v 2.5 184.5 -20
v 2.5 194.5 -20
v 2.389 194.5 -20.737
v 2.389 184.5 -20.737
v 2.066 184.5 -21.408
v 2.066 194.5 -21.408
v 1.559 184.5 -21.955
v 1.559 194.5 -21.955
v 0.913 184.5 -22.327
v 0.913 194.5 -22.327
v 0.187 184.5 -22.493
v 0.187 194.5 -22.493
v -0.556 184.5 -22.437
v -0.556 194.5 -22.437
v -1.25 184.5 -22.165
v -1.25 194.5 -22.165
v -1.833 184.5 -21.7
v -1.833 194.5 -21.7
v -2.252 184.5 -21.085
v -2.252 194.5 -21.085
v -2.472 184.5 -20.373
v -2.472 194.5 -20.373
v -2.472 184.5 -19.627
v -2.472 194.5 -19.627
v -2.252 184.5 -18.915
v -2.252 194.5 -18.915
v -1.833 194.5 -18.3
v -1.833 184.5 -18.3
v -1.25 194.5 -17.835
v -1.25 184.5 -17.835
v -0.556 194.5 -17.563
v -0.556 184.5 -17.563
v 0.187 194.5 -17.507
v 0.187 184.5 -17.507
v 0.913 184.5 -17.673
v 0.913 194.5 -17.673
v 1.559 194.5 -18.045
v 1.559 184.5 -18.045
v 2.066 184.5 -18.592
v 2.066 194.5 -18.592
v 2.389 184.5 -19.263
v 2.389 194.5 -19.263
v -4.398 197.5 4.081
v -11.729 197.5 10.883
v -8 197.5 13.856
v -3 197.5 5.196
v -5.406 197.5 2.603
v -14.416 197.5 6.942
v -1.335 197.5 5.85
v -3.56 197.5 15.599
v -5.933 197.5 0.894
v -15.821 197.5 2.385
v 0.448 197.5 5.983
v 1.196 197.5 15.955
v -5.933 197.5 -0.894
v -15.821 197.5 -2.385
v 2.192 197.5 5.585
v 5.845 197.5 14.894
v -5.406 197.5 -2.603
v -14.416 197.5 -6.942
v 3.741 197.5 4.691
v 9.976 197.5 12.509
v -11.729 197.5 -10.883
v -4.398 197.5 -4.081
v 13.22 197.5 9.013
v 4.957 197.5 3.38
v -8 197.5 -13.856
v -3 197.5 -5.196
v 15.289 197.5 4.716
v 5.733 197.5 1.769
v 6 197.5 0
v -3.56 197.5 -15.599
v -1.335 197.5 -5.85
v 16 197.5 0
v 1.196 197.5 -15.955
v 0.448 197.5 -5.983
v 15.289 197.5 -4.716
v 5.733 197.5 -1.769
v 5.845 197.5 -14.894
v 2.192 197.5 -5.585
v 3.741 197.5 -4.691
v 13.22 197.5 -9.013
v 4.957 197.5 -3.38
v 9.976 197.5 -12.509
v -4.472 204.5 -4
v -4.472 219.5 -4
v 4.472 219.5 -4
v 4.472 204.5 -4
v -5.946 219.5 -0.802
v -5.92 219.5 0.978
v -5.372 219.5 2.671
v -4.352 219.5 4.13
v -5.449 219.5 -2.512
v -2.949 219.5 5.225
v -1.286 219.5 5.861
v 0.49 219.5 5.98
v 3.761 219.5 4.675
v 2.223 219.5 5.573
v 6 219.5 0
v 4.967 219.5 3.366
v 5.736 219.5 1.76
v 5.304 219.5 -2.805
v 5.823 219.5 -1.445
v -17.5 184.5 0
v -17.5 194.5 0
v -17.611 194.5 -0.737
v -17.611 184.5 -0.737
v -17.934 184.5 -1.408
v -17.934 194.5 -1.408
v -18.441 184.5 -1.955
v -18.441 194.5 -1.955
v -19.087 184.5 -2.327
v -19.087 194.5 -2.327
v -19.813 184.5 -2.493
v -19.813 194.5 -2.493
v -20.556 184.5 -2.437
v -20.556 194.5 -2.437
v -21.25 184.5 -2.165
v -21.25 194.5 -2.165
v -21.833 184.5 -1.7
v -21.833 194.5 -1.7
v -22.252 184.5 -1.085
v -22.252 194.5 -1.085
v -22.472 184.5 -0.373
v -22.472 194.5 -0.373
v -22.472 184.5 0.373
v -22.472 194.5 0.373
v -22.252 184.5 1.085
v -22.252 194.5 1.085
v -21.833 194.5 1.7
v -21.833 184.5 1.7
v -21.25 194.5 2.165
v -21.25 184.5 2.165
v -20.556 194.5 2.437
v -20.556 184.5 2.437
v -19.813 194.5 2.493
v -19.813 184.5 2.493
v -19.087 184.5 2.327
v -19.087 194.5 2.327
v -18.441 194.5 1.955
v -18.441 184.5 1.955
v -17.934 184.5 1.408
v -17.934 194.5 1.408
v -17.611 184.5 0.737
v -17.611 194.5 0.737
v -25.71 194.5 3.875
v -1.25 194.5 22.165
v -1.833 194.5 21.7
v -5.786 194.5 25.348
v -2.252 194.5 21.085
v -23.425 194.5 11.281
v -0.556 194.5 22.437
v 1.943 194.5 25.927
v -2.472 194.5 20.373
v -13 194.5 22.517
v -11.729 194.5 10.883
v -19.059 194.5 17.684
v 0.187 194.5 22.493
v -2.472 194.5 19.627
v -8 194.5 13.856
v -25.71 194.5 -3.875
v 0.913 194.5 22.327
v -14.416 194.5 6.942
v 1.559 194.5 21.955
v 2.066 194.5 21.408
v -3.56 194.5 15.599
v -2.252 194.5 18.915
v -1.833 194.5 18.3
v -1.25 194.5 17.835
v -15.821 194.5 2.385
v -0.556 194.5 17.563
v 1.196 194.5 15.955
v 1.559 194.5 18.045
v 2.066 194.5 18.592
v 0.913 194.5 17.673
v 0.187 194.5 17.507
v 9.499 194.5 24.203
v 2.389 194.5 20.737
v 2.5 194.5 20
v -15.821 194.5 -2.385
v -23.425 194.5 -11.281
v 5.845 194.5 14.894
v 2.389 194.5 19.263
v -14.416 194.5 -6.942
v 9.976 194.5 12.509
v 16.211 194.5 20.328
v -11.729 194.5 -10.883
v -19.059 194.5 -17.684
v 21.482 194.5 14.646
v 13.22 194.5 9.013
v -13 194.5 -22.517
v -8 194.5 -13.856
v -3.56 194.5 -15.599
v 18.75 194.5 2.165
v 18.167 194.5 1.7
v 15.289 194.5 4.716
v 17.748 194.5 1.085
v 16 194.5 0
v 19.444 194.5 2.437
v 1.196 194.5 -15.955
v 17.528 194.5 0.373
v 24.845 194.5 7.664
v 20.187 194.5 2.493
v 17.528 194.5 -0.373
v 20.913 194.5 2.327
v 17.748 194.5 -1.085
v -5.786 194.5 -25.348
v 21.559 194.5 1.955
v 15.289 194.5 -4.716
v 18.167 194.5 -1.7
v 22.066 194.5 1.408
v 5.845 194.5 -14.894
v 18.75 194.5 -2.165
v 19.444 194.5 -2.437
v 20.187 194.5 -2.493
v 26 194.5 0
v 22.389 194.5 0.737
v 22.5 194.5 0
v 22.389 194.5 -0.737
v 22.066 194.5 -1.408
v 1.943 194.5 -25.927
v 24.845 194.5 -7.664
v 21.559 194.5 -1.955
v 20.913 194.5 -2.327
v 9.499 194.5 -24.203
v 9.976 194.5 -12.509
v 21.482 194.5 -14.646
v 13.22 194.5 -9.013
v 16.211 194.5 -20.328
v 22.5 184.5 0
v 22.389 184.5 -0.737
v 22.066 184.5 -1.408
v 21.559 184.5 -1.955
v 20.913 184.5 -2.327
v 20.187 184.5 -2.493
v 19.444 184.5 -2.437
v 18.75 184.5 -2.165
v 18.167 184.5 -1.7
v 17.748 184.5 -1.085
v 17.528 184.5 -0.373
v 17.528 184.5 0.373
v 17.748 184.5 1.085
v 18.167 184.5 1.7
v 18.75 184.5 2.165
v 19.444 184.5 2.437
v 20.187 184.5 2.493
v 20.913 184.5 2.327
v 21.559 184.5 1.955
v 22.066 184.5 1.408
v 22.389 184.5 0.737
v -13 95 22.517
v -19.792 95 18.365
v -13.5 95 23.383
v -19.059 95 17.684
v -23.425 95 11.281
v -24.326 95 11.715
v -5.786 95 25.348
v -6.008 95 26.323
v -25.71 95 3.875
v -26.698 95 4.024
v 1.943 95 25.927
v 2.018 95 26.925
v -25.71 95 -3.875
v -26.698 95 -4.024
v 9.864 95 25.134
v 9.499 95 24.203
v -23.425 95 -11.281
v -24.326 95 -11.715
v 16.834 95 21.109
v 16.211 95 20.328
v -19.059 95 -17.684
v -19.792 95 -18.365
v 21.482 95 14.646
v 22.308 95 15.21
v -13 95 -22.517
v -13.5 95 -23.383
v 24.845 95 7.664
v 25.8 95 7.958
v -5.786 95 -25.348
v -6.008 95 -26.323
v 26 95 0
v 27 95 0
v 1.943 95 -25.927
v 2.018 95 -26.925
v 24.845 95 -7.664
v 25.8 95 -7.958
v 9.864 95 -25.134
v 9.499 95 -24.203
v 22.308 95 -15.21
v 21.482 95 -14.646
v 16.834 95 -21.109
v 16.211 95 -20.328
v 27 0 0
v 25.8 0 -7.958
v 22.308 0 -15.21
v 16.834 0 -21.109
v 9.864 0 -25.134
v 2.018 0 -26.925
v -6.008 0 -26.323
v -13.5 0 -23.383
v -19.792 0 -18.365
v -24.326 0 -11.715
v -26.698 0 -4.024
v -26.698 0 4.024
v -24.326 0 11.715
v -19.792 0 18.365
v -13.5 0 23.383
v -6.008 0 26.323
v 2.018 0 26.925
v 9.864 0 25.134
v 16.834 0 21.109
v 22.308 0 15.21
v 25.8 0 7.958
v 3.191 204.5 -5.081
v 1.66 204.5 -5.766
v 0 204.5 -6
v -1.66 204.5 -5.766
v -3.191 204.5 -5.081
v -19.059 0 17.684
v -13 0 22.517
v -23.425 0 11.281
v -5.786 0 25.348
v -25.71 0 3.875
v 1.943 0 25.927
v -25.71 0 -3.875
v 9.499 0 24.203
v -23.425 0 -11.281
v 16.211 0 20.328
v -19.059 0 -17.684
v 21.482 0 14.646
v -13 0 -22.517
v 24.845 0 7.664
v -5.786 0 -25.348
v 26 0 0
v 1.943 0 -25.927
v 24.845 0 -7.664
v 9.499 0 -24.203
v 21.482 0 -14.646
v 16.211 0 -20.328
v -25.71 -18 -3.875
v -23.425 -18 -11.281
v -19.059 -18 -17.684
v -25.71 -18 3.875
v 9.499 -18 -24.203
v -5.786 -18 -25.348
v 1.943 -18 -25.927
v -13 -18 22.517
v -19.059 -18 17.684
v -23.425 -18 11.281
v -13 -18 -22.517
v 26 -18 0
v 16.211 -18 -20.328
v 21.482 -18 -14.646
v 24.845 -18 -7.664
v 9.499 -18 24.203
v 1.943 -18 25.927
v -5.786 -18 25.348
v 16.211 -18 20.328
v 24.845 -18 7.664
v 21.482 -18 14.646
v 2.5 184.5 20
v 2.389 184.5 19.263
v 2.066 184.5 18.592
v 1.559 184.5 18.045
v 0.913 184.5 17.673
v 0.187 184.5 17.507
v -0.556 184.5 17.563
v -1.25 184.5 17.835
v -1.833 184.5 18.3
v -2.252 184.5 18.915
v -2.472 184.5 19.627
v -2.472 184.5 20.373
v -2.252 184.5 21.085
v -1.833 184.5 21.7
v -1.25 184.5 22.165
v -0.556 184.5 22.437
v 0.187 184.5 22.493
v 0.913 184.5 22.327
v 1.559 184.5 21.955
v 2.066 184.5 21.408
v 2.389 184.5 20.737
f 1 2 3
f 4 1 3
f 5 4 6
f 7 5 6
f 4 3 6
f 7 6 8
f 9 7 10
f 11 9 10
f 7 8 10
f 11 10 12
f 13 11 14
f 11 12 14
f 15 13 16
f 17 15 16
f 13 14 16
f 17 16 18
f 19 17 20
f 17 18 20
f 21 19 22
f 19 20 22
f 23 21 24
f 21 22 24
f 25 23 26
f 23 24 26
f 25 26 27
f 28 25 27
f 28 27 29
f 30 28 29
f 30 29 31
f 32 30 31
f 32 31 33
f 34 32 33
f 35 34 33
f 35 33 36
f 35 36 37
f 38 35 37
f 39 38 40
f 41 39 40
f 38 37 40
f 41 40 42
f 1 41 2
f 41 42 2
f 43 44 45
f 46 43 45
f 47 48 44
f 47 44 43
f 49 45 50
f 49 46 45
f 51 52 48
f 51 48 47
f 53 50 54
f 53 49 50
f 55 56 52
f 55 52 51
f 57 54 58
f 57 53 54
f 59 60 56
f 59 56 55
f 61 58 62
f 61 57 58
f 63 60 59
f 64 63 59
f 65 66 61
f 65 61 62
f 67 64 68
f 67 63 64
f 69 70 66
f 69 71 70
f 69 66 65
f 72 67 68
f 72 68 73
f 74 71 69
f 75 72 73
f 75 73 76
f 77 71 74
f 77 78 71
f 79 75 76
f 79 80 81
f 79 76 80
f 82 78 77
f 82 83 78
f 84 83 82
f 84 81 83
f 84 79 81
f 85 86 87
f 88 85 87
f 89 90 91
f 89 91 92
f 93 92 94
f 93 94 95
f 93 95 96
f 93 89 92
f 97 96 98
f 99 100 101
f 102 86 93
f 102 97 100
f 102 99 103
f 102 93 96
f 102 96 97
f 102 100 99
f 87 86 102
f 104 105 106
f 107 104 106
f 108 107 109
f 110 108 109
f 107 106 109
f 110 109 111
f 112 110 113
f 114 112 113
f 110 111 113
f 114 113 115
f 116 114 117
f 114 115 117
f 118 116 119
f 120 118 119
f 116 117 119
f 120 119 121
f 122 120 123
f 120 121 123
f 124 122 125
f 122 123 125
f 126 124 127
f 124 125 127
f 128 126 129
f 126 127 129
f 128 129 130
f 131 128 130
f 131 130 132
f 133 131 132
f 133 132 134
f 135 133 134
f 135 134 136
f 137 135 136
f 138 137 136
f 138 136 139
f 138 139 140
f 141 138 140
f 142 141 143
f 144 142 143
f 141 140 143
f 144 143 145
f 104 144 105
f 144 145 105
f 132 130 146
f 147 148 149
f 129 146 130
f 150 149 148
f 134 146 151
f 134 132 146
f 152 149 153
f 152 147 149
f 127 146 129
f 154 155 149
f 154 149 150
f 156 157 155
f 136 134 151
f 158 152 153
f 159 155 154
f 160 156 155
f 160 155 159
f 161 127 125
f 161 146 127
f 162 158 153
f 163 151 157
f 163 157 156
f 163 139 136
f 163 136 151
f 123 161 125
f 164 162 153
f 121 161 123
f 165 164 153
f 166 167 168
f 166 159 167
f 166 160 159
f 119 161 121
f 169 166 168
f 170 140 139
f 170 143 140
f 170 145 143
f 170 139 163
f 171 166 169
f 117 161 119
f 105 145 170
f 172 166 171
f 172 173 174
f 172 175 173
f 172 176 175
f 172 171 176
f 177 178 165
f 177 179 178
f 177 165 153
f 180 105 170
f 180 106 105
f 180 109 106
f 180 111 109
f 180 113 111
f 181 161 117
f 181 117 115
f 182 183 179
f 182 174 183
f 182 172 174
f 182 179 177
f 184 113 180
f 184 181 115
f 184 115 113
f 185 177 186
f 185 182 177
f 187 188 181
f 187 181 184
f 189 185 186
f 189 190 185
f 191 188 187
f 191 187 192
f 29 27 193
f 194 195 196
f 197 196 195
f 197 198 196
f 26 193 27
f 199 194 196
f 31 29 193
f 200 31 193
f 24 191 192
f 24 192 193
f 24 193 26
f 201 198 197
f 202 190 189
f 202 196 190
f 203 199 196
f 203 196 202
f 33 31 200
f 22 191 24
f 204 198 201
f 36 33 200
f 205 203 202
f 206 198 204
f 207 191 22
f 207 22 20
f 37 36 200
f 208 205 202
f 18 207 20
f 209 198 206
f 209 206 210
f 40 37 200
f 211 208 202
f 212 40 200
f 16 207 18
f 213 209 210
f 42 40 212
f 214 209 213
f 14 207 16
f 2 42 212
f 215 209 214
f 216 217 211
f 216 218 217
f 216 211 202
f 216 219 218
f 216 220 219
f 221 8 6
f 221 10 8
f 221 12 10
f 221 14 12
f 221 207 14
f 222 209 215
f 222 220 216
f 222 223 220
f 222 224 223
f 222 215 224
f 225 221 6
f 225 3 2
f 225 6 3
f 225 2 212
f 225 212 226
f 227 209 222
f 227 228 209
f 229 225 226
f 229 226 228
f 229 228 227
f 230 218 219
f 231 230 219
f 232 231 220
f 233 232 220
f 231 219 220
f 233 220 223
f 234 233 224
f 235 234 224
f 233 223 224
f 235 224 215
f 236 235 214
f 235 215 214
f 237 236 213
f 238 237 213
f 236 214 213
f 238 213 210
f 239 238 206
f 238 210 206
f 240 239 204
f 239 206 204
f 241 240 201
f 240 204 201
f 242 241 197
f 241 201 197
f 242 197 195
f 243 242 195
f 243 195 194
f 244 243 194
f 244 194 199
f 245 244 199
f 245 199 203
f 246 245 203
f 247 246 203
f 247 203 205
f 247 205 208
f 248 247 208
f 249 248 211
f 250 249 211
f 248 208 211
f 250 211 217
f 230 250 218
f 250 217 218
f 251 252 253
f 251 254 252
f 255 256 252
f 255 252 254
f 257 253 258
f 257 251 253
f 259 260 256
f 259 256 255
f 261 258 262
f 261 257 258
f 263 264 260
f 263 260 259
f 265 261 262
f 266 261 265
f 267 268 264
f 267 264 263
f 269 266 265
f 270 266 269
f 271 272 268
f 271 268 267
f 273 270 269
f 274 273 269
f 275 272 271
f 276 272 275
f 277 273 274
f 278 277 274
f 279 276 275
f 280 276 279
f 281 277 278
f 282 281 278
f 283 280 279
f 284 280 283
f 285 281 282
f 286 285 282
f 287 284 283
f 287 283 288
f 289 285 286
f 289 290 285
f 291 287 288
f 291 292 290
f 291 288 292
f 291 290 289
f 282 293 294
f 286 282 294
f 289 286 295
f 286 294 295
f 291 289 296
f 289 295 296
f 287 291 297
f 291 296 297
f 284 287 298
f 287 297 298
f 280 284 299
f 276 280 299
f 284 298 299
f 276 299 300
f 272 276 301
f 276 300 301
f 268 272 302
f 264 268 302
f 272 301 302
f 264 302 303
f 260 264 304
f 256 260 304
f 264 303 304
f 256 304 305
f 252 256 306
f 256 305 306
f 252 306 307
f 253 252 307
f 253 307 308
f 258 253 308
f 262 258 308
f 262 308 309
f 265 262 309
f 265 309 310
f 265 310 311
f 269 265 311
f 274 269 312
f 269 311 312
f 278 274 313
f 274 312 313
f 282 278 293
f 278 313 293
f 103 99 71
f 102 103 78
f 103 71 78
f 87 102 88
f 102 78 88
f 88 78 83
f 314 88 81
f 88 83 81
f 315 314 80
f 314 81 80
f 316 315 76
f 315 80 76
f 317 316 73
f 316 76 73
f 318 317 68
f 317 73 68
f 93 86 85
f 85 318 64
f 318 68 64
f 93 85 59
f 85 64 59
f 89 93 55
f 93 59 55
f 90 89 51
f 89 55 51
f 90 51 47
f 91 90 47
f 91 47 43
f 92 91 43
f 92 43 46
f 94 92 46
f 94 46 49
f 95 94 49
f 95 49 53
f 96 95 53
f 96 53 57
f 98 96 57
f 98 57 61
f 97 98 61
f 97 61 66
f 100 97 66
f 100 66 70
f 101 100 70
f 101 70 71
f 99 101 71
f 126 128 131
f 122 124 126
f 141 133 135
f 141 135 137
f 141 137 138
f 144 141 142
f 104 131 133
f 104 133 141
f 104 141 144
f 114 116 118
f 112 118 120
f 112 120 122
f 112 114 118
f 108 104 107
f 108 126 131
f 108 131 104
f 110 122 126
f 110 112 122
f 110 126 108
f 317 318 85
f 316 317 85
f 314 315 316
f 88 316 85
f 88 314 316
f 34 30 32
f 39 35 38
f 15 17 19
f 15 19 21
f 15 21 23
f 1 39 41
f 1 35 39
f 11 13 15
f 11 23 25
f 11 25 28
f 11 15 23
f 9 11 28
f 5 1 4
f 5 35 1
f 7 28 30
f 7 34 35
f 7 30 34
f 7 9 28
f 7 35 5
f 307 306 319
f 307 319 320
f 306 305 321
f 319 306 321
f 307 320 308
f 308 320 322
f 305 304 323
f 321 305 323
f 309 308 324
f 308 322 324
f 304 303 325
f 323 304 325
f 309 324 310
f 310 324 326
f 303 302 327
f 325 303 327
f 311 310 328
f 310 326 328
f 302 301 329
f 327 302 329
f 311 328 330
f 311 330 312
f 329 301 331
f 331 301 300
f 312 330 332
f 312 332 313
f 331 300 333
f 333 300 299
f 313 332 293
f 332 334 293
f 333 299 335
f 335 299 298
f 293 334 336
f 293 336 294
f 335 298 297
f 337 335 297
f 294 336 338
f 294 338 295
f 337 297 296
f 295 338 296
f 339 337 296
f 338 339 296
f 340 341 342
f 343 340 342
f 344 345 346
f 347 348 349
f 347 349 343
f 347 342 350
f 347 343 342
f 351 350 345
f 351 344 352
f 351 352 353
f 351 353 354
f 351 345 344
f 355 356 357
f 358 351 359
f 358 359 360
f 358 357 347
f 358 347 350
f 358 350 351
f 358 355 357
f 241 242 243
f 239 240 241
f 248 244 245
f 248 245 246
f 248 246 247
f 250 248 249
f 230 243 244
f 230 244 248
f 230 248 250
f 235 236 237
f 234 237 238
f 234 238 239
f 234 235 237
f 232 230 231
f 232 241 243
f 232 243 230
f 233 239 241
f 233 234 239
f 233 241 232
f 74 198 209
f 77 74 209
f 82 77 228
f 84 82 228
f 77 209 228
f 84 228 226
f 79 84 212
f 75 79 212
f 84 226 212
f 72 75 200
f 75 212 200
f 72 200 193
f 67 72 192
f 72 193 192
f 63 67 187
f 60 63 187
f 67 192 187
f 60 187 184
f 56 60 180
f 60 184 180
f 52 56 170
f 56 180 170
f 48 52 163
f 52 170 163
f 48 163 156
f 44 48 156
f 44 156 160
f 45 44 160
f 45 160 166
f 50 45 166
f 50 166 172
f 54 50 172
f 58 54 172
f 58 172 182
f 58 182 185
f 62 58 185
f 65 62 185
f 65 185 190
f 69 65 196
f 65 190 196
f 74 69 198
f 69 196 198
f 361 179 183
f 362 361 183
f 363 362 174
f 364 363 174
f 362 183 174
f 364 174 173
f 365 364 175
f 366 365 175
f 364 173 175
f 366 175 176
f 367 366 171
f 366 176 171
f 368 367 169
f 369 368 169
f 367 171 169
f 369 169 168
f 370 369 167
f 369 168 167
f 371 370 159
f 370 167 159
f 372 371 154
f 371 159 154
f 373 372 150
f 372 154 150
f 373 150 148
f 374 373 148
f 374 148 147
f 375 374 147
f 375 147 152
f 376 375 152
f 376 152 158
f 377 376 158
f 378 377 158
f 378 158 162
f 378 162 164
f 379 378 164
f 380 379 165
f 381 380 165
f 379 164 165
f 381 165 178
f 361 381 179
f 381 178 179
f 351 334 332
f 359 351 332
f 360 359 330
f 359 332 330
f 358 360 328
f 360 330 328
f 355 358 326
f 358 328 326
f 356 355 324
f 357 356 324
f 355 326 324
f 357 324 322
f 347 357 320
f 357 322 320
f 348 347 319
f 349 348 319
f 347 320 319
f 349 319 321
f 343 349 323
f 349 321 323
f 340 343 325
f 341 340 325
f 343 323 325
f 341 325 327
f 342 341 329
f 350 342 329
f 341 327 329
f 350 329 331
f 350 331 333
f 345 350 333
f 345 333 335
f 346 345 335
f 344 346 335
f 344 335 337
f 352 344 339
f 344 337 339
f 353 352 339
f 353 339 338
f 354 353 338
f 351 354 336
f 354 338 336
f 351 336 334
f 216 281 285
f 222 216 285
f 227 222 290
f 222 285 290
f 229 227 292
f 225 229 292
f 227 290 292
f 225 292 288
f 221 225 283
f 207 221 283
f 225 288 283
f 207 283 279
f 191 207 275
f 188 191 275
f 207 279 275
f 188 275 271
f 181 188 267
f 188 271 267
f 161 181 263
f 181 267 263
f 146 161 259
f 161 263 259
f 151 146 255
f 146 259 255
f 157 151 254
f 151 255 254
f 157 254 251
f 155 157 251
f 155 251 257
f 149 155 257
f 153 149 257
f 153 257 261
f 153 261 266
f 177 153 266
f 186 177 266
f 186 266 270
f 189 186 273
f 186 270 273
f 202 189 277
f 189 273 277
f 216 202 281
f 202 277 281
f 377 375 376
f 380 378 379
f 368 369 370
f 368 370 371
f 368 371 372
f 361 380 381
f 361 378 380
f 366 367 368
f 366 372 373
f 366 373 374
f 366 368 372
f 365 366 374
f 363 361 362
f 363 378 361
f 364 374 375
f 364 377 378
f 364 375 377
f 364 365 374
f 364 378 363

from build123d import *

# Parameters (mm, degrees)
SKETCH1_R           = 27
BOSS_EXTRUDE1_DEPTH = 95
SKETCH2_R           = 26
BOSS_EXTRUDE2_DEPTH = 99.5
SKETCH3_R           = 16
BOSS_EXTRUDE3_DEPTH = 3
SKETCH4_R           = 6
BOSS_EXTRUDE4_DEPTH = 22
CUT_EXTRUDE1_DEPTH  = 15
SKETCH6_R           = 2.5
CUT_EXTRUDE2_DEPTH  = 10
SKETCH7_R           = 26
BOSS_EXTRUDE5_DEPTH = 18


with BuildPart() as part:
    # Sketch1 → Boss-Extrude1 (new body)
    with BuildSketch(Plane(origin=(0, 0, 0), x_dir=(1, 0, 0), z_dir=(0, 1, 0))):
        Circle(SKETCH1_R)
    extrude(amount=BOSS_EXTRUDE1_DEPTH)

    # Sketch2 → Boss-Extrude2 (add)
    with BuildSketch(Plane(origin=(0, 95, 0), x_dir=(1, 0, 0), z_dir=(0, 1, 0))):
        Circle(SKETCH2_R)
    extrude(amount=BOSS_EXTRUDE2_DEPTH)

    # Sketch3 → Boss-Extrude3 (add)
    with BuildSketch(Plane(origin=(0, 194.5, 0), x_dir=(1, 0, 0), z_dir=(0, 1, 0))):
        Circle(SKETCH3_R)
    extrude(amount=BOSS_EXTRUDE3_DEPTH)

    # Sketch4 → Boss-Extrude4 (add)
    with BuildSketch(Plane(origin=(0, 197.5, 0), x_dir=(1, 0, 0), z_dir=(0, 1, 0))):
        Circle(SKETCH4_R)
    extrude(amount=BOSS_EXTRUDE4_DEPTH)

    # Sketch5 → Cut-Extrude1 (cut)
    with BuildSketch(Plane(origin=(0, 219.5, 0), x_dir=(1, 0, 0), z_dir=(0, 1, 0))):
        with BuildLine():
            Line((-4.472135955, 4), (4.472135955, 4))
            ThreePointArc((4.472135955, 4), (0, 6), (-4.472135955, 4))
        make_face()
    extrude(amount=-CUT_EXTRUDE1_DEPTH, mode=Mode.SUBTRACT)

    # Sketch6 → Cut-Extrude2 (cut)
    with BuildSketch(Plane(origin=(0, 194.5, 0), x_dir=(1, 0, 0), z_dir=(0, 1, 0))):
        with Locations((0, 20)):
            Circle(SKETCH6_R)
        with Locations((-20, 0)):
            Circle(SKETCH6_R)
        with Locations((0, -20)):
            Circle(SKETCH6_R)
        with Locations((20, 0)):
            Circle(SKETCH6_R)
    extrude(amount=-CUT_EXTRUDE2_DEPTH, mode=Mode.SUBTRACT)

    # Sketch7 → Boss-Extrude5 (add)
    with BuildSketch(Plane.XZ):
        Circle(SKETCH7_R)
    extrude(amount=BOSS_EXTRUDE5_DEPTH)


solid = part.part
